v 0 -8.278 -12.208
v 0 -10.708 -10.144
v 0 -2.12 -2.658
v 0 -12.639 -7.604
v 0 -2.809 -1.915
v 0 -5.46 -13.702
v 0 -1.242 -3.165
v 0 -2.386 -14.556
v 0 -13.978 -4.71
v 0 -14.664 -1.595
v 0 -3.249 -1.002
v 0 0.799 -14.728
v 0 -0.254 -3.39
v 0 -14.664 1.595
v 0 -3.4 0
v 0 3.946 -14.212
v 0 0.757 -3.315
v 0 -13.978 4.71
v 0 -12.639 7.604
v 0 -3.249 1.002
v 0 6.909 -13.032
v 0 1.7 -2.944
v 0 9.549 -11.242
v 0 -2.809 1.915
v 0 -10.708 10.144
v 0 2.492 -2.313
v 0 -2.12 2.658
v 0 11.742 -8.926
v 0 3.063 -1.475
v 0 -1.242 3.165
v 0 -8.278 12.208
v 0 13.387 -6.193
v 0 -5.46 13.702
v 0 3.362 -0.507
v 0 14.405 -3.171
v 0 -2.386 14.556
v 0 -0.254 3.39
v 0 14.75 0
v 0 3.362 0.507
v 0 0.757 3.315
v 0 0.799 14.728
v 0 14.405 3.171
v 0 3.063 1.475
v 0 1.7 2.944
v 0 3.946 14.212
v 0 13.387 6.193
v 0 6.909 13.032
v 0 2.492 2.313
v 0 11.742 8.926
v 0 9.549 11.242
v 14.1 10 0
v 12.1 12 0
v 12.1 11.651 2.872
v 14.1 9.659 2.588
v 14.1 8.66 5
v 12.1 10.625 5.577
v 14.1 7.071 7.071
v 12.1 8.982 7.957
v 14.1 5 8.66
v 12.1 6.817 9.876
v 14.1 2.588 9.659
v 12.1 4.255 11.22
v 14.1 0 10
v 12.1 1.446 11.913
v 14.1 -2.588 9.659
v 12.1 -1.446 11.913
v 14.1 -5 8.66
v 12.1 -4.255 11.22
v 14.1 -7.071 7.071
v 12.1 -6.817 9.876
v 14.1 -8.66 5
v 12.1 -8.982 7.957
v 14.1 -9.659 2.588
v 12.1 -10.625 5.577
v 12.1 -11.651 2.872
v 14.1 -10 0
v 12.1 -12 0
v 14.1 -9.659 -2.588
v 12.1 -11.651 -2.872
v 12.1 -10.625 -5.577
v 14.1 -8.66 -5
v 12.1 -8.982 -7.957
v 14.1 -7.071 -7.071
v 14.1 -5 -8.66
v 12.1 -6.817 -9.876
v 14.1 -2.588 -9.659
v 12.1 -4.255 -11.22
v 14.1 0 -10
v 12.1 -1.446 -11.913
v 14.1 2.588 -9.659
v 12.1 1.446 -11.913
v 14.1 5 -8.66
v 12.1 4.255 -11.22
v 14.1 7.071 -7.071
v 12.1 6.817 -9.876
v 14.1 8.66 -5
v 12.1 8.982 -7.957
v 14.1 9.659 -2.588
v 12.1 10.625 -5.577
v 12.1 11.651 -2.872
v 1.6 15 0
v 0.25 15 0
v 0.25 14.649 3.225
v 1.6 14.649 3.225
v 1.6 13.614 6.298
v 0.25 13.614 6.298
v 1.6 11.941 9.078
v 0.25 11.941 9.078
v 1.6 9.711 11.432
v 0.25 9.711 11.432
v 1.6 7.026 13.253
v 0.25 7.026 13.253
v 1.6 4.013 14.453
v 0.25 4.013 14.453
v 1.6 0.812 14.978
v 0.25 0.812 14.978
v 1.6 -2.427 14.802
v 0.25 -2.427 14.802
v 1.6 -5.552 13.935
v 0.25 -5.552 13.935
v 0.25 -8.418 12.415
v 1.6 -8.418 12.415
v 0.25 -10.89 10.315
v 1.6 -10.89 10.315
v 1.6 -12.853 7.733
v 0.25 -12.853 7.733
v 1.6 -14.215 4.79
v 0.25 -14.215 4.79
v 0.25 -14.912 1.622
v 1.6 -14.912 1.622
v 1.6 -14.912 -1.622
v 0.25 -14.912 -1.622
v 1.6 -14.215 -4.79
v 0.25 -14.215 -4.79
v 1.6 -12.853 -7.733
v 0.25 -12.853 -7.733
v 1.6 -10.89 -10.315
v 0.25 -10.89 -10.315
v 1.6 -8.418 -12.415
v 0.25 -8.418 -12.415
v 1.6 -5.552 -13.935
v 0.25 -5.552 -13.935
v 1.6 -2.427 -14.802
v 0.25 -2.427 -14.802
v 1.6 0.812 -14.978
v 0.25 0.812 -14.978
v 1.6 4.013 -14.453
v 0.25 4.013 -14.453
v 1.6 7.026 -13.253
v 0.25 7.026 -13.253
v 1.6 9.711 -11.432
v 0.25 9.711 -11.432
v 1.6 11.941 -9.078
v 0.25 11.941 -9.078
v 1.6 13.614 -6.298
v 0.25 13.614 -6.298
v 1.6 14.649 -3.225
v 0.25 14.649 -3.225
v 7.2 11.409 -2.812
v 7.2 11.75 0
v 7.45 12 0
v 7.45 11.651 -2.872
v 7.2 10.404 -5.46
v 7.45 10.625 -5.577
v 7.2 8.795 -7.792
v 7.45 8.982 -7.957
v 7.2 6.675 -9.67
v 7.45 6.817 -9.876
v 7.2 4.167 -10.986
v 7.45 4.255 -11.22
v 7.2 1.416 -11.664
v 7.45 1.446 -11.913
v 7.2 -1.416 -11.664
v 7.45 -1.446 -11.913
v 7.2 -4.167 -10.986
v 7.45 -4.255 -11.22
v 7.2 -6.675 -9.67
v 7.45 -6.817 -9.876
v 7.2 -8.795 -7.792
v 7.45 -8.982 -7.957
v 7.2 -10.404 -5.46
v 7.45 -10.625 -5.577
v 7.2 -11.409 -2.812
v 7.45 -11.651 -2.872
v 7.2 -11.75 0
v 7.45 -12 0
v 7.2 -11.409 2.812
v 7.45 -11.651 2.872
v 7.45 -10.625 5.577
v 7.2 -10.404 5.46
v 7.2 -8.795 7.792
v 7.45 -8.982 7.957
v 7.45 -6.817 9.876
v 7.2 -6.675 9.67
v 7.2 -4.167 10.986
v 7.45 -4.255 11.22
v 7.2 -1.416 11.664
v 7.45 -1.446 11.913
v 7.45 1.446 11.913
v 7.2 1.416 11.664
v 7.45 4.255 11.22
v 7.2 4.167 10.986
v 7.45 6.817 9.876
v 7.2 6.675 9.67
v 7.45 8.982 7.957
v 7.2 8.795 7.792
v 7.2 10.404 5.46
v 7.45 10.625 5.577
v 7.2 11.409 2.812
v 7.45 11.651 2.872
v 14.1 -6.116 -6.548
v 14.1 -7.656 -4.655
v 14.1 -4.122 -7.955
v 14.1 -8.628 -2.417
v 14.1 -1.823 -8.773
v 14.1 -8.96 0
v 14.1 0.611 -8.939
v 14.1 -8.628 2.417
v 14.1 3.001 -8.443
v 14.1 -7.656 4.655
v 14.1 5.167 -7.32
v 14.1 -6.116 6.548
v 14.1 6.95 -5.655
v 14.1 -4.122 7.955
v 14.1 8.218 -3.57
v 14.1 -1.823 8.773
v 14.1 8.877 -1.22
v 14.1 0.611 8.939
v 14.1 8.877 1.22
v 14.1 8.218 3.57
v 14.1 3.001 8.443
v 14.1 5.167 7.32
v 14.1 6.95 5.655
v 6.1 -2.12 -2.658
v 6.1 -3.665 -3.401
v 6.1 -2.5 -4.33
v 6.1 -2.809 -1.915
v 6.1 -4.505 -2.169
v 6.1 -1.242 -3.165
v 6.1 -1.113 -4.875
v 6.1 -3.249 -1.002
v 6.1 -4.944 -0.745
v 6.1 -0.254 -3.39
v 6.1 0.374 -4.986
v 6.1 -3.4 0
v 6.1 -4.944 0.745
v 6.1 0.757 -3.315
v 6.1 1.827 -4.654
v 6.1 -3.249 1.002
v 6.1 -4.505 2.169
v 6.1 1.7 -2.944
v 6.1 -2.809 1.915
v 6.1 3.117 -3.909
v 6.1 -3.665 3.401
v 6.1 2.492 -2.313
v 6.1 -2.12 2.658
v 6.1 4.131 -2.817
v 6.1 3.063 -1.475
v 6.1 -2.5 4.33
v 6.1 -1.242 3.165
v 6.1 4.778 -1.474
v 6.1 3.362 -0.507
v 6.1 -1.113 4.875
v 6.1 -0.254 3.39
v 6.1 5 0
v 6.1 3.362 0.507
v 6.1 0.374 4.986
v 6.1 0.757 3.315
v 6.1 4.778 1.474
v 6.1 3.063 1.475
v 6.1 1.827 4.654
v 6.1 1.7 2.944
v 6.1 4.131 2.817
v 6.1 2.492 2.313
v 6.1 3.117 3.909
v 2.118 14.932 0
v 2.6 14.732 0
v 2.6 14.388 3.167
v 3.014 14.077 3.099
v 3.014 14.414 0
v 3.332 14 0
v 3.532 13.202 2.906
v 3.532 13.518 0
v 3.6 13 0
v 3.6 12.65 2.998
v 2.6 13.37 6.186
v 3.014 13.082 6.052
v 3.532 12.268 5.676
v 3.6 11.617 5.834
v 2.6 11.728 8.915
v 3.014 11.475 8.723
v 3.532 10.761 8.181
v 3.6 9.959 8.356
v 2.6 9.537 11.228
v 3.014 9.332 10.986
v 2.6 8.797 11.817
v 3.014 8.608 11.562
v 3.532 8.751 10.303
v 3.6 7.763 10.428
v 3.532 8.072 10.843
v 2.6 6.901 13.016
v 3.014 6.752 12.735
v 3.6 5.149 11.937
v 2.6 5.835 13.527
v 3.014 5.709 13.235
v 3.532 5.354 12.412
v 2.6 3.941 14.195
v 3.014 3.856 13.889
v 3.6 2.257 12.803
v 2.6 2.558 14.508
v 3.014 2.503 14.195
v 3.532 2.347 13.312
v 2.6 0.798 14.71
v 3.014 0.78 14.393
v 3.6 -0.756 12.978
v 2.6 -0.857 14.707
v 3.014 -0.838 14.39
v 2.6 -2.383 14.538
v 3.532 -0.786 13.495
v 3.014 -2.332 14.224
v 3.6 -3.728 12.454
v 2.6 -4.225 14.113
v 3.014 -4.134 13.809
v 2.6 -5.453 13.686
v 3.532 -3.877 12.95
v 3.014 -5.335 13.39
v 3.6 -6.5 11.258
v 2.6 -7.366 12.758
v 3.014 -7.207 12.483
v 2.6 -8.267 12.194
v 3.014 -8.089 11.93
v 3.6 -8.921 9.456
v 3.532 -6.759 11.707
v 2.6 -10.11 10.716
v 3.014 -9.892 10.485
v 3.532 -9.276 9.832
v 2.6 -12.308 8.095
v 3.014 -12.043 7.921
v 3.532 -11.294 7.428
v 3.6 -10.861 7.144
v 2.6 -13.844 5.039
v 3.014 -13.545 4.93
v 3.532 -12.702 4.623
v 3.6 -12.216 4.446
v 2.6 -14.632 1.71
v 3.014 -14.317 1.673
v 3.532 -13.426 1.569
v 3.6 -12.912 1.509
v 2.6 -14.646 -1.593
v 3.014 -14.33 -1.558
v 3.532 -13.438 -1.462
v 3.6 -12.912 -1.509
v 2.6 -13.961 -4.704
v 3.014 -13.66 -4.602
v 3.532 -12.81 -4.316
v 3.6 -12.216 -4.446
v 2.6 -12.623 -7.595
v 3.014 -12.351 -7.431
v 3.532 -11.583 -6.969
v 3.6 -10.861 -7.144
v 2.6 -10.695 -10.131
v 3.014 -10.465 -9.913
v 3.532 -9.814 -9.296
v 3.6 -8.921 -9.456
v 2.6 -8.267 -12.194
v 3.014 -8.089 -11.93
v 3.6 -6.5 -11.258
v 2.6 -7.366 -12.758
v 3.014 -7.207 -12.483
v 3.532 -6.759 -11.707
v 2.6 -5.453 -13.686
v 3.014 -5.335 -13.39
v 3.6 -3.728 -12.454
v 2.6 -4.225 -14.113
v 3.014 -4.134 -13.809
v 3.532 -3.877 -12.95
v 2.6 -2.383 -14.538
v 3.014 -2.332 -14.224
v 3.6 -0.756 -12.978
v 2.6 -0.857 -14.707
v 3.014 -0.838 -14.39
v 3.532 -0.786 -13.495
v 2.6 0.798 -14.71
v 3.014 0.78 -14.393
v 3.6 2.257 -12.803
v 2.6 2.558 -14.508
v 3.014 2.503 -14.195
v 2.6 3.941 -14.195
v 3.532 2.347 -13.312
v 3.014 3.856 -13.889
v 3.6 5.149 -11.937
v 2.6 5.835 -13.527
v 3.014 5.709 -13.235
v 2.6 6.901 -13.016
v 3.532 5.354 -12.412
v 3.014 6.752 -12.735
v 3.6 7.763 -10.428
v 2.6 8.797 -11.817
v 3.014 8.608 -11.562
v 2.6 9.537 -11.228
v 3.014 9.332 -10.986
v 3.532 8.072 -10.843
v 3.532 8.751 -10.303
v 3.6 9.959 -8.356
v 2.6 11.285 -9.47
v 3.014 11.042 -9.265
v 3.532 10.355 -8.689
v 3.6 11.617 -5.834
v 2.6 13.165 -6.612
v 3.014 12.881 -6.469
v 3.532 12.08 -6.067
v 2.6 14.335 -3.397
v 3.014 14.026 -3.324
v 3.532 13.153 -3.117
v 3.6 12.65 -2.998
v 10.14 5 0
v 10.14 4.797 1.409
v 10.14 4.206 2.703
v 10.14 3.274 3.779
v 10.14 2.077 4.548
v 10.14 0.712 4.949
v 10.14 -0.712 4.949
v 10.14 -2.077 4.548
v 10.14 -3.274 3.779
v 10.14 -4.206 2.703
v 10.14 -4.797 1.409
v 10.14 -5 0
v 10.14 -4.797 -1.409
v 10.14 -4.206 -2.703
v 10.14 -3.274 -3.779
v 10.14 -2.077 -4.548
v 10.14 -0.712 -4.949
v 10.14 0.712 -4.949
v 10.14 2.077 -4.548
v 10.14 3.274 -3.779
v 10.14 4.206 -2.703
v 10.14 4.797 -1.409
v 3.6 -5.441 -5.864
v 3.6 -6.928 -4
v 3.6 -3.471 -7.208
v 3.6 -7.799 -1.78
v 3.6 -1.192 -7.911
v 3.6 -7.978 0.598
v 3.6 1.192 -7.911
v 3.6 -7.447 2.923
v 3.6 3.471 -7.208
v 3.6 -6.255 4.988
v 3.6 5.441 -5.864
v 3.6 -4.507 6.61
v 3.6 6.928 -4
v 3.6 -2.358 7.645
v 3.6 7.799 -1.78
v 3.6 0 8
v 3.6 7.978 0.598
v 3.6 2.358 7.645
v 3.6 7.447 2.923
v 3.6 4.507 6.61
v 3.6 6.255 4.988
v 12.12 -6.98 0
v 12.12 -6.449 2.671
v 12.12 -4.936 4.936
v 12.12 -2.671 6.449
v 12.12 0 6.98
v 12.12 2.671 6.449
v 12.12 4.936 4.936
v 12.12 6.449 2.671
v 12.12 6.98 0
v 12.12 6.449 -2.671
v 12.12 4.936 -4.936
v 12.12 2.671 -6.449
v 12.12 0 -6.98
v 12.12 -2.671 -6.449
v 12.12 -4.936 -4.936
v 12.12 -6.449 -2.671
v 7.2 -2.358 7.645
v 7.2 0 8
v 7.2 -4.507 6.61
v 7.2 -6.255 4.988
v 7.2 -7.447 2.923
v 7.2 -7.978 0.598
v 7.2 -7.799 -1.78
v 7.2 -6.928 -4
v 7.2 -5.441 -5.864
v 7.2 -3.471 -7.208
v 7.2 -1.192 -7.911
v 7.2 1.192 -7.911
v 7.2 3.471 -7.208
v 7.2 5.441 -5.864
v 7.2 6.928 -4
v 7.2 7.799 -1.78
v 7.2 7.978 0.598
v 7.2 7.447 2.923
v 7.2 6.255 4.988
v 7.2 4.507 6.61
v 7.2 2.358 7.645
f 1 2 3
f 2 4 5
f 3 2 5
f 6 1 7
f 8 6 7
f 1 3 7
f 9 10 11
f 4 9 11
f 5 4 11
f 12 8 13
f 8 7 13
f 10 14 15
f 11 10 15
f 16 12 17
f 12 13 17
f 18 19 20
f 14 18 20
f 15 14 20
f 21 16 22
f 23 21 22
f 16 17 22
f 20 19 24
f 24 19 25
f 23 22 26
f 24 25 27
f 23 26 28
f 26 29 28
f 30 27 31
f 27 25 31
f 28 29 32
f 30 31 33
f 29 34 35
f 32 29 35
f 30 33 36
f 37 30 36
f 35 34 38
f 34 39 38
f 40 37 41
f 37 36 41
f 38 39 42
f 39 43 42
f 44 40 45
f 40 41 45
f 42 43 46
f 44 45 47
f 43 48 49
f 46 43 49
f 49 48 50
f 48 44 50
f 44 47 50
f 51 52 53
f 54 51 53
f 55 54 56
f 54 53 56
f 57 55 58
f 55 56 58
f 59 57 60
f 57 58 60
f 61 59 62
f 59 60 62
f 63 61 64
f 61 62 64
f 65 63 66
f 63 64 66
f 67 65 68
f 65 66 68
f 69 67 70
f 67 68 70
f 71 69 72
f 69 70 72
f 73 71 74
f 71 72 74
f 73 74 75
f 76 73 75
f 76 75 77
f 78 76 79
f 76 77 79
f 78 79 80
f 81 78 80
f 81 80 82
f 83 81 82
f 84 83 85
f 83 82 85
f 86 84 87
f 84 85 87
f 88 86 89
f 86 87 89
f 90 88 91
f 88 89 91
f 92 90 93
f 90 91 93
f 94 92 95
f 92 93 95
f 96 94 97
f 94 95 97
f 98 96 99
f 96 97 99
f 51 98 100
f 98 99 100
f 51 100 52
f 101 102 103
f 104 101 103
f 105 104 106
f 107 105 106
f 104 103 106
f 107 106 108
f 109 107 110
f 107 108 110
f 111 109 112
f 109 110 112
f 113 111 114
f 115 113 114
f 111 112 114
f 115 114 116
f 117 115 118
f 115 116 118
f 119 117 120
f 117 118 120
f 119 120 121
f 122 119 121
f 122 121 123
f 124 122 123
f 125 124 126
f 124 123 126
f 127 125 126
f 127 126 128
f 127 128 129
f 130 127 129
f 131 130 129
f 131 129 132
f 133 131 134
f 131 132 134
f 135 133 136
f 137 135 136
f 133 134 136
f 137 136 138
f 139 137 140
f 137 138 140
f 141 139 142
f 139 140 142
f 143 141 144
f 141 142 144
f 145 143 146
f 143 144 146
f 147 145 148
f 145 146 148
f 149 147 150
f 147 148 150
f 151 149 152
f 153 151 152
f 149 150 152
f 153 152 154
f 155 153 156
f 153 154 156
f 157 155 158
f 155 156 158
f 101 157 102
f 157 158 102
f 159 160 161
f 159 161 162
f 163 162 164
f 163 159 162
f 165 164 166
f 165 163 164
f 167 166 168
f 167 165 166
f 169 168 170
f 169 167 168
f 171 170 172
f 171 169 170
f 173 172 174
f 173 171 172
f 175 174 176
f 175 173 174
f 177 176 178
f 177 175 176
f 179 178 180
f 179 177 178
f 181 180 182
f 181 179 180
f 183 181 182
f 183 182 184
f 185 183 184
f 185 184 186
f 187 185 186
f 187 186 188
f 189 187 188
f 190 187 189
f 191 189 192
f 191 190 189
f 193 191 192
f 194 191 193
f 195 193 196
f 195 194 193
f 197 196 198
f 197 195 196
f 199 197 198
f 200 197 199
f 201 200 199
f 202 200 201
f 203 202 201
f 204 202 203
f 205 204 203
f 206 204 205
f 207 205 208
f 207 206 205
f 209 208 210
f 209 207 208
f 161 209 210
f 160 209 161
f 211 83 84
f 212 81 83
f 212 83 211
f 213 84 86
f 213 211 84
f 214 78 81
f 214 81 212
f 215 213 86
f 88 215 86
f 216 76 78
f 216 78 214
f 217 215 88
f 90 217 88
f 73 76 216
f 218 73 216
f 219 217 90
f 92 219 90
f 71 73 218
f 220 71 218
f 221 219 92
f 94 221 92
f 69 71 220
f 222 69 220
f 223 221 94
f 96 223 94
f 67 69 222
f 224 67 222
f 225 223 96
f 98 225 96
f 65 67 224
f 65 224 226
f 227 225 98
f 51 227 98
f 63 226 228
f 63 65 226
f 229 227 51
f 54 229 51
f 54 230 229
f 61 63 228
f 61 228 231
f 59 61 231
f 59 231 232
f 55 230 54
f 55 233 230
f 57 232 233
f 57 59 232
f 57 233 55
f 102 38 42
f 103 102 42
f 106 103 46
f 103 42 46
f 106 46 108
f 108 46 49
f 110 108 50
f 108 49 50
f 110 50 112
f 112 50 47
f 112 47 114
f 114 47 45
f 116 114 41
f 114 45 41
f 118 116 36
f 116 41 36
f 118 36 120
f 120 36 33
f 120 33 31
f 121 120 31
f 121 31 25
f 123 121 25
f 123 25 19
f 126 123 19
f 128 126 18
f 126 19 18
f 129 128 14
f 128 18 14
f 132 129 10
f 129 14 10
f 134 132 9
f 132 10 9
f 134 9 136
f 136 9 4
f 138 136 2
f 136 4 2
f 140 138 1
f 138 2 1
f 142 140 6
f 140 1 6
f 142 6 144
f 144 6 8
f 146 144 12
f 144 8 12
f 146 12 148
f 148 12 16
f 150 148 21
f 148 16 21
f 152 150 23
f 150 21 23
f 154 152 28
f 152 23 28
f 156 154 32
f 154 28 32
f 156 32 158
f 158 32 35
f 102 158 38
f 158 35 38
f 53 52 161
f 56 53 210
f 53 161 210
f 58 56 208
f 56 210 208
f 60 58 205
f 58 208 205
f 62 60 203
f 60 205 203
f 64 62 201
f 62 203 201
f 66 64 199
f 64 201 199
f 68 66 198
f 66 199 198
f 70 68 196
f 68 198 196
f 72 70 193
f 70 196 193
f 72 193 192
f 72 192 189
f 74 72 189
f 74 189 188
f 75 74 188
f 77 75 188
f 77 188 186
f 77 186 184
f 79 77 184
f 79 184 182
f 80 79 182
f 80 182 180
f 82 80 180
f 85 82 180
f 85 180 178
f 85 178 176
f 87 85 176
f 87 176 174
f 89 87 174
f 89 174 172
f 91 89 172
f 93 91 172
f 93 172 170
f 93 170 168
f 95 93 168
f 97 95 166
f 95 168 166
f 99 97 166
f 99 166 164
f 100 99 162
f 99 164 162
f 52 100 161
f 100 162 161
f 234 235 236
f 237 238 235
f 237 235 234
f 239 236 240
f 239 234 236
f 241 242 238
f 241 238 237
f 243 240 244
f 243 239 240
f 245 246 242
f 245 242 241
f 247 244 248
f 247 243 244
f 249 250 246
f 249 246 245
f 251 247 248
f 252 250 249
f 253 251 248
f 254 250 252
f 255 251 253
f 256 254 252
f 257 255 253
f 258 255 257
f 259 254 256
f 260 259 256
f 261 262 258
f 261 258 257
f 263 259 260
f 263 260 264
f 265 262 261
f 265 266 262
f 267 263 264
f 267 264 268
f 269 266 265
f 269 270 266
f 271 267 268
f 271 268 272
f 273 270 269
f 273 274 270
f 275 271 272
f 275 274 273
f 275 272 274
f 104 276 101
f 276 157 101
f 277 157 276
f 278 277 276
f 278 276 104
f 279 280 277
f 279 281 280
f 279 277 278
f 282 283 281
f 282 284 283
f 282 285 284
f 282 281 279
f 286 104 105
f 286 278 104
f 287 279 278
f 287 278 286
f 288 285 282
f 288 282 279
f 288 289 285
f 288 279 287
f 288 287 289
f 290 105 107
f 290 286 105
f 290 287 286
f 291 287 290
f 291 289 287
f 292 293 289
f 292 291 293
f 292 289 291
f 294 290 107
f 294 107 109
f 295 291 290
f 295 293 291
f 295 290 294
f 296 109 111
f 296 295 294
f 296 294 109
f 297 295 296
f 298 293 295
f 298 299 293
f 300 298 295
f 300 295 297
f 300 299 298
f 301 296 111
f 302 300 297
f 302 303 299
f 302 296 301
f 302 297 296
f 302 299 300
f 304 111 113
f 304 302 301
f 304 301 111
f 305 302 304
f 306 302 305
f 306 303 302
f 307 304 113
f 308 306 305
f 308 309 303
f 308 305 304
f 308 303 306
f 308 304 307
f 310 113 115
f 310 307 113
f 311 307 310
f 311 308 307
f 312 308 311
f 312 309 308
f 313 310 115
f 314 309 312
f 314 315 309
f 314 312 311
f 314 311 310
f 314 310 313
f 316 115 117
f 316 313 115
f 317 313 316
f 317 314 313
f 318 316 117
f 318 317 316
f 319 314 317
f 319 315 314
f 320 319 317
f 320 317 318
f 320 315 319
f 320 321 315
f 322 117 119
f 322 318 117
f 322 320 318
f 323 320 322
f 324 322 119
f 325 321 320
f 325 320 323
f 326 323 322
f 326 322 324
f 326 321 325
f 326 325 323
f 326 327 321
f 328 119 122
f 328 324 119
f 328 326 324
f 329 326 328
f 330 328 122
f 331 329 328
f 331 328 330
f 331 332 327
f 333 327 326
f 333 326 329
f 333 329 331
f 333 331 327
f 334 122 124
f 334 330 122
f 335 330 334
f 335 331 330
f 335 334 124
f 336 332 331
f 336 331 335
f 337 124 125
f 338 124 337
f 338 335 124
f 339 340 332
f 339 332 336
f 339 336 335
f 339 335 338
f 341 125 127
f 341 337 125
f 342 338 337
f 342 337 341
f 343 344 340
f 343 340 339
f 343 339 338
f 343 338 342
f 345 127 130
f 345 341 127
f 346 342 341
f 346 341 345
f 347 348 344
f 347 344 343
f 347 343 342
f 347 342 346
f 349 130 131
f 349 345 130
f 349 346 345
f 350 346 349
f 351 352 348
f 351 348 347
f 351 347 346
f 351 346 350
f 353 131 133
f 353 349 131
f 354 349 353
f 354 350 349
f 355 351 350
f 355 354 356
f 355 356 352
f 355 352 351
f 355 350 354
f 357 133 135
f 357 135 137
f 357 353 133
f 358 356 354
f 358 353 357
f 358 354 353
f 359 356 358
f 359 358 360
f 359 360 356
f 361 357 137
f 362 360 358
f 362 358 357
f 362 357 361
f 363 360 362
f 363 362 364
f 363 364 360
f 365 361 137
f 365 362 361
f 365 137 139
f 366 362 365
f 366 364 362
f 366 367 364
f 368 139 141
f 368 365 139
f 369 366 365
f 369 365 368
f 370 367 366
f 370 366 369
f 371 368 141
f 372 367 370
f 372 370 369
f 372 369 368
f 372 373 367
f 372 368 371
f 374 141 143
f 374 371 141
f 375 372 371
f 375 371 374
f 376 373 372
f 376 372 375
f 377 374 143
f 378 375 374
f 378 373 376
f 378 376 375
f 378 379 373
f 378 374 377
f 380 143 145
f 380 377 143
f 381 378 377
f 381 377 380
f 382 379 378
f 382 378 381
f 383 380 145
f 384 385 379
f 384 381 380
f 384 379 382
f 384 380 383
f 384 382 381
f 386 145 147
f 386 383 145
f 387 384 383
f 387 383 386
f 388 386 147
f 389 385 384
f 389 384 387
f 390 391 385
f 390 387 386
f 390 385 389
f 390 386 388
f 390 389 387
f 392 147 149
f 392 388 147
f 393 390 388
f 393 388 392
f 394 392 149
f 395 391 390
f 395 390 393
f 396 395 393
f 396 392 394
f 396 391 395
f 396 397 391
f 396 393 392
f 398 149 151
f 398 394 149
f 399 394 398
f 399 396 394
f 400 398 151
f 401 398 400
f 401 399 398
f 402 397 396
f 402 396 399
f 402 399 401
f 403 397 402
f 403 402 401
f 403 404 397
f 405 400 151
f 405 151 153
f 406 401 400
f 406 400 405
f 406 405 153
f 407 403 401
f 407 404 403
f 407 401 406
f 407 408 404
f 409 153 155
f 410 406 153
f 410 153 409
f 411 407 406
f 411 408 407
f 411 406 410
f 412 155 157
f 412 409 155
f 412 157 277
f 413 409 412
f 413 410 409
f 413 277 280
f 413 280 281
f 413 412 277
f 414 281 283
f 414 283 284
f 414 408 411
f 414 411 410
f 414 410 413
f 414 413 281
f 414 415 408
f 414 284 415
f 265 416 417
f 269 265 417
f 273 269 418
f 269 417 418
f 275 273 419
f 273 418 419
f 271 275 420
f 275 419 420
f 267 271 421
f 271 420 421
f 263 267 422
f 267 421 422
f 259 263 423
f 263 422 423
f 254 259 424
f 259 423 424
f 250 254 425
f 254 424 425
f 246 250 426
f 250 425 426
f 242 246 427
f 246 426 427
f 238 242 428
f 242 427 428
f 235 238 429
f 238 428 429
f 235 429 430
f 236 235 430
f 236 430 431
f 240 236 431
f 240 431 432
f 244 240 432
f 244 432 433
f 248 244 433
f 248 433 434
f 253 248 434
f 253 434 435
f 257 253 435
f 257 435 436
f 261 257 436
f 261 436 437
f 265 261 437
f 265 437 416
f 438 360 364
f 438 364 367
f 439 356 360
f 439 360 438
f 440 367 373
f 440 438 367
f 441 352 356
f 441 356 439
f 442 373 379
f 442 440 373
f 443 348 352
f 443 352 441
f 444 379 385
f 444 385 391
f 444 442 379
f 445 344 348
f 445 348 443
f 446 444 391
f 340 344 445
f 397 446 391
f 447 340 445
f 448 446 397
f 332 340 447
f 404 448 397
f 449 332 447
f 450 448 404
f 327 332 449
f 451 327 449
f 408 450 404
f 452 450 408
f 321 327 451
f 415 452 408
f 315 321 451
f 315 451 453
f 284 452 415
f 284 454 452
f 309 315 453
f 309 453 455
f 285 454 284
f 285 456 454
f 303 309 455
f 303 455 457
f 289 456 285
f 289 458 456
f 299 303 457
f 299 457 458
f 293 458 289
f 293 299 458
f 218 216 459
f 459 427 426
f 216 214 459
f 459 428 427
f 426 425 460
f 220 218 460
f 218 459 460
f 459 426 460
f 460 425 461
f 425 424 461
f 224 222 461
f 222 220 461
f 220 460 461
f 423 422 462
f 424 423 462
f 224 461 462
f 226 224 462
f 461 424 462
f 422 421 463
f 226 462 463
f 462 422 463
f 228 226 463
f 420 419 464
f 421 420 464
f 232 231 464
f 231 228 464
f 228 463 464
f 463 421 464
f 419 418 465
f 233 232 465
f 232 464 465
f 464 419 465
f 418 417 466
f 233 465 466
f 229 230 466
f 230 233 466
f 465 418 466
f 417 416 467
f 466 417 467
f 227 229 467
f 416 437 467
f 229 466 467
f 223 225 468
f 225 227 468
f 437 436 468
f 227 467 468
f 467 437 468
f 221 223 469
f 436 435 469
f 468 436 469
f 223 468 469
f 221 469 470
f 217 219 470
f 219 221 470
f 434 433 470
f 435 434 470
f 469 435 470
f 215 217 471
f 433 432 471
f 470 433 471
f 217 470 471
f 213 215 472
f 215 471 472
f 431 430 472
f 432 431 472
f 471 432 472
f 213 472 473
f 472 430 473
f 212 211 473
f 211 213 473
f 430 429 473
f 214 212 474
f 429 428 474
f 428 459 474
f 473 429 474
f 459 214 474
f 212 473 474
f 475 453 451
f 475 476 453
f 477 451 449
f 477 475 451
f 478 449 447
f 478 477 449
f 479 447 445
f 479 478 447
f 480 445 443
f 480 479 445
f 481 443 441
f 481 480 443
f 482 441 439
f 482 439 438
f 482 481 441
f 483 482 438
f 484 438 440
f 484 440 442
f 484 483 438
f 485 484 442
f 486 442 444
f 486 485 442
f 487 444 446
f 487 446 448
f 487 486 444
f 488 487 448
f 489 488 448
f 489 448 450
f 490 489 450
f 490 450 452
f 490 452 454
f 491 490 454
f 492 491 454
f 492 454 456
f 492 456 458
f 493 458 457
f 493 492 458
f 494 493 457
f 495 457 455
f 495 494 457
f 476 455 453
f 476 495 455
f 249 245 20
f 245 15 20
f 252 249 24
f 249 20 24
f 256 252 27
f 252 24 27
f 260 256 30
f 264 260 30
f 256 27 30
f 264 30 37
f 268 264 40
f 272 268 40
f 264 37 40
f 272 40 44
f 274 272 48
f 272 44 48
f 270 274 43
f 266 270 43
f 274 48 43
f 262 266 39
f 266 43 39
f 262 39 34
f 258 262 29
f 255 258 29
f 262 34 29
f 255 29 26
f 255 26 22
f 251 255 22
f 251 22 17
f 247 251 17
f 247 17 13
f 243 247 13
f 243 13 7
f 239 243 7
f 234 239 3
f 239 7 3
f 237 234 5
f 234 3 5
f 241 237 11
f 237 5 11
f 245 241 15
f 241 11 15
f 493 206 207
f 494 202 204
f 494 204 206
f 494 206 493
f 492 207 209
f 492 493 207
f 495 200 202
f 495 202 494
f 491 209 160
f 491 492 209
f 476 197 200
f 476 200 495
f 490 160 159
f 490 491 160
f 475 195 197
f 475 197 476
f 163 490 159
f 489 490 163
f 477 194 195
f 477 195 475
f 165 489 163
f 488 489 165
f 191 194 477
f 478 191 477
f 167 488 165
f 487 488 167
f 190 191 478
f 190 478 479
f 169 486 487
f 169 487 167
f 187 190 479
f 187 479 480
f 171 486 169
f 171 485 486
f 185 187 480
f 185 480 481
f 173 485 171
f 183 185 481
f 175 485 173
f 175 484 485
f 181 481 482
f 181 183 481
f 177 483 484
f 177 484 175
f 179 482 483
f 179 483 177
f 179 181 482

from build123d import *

# Parameters (mm, degrees)
F0_R           = 15
F1_DEPTH       = 3.6
F2_R           = 12
F3_DEPTH       = 10.5
F5_D           = 6.8
F5_CSINK_D     = 17.92
F5_CSINK_ANGLE = 90
F6_W           = 3.6
F6_H           = 5
F8_SIZE        = 0.25
F9_R           = 2
F10_SIZE       = 2
F11_R          = 5
F12_DEPTH      = 8


with BuildPart() as f1:
    # F0 (on Right) → F1 (new body)
    with BuildSketch(Plane.YZ):
        Circle(F0_R)
    extrude(amount=F1_DEPTH)

    # F2 (on face) → F3 (join)
    with BuildSketch(Plane.YZ.offset(3.6)):
        Circle(F2_R)
    extrude(amount=F3_DEPTH)

    # F5 (through all)
    with Locations(Plane.YZ.offset(14.1)):
        with Locations((0, 0)):
            CounterSinkHole(F5_D / 2, F5_CSINK_D / 2, counter_sink_angle=F5_CSINK_ANGLE)

    # F6 (on Front) → F7 (revolve, cut)
    with BuildSketch(Plane.XZ):
        with Locations((5.4, 10.5)):
            Rectangle(F6_W, F6_H)
    revolve(axis=Axis((8.5571676374, 0, 0), (1, 0, 0)), mode=Mode.SUBTRACT)

    # F8
    f8_edges = [f1.edges().sort_by_distance(p)[0] for p in [
        (0, -15, 0),
        (7.2, -12, 0),
    ]]
    chamfer(f8_edges, length=F8_SIZE)

    # F9
    f9_edges = [f1.edges().sort_by_distance(p)[0] for p in [
        (3.6, -15, 0),
    ]]
    fillet(f9_edges, radius=F9_R)

    # F10
    f10_edges = [f1.edges().sort_by_distance(p)[0] for p in [
        (14.1, -12, 0),
    ]]
    chamfer(f10_edges, length=F10_SIZE)

    # F11 (on face) → F12 (cut)
    with BuildSketch(Plane.YZ.offset(14.1)):
        Circle(F11_R)
    extrude(amount=-F12_DEPTH, mode=Mode.SUBTRACT)


solid = f1.part
